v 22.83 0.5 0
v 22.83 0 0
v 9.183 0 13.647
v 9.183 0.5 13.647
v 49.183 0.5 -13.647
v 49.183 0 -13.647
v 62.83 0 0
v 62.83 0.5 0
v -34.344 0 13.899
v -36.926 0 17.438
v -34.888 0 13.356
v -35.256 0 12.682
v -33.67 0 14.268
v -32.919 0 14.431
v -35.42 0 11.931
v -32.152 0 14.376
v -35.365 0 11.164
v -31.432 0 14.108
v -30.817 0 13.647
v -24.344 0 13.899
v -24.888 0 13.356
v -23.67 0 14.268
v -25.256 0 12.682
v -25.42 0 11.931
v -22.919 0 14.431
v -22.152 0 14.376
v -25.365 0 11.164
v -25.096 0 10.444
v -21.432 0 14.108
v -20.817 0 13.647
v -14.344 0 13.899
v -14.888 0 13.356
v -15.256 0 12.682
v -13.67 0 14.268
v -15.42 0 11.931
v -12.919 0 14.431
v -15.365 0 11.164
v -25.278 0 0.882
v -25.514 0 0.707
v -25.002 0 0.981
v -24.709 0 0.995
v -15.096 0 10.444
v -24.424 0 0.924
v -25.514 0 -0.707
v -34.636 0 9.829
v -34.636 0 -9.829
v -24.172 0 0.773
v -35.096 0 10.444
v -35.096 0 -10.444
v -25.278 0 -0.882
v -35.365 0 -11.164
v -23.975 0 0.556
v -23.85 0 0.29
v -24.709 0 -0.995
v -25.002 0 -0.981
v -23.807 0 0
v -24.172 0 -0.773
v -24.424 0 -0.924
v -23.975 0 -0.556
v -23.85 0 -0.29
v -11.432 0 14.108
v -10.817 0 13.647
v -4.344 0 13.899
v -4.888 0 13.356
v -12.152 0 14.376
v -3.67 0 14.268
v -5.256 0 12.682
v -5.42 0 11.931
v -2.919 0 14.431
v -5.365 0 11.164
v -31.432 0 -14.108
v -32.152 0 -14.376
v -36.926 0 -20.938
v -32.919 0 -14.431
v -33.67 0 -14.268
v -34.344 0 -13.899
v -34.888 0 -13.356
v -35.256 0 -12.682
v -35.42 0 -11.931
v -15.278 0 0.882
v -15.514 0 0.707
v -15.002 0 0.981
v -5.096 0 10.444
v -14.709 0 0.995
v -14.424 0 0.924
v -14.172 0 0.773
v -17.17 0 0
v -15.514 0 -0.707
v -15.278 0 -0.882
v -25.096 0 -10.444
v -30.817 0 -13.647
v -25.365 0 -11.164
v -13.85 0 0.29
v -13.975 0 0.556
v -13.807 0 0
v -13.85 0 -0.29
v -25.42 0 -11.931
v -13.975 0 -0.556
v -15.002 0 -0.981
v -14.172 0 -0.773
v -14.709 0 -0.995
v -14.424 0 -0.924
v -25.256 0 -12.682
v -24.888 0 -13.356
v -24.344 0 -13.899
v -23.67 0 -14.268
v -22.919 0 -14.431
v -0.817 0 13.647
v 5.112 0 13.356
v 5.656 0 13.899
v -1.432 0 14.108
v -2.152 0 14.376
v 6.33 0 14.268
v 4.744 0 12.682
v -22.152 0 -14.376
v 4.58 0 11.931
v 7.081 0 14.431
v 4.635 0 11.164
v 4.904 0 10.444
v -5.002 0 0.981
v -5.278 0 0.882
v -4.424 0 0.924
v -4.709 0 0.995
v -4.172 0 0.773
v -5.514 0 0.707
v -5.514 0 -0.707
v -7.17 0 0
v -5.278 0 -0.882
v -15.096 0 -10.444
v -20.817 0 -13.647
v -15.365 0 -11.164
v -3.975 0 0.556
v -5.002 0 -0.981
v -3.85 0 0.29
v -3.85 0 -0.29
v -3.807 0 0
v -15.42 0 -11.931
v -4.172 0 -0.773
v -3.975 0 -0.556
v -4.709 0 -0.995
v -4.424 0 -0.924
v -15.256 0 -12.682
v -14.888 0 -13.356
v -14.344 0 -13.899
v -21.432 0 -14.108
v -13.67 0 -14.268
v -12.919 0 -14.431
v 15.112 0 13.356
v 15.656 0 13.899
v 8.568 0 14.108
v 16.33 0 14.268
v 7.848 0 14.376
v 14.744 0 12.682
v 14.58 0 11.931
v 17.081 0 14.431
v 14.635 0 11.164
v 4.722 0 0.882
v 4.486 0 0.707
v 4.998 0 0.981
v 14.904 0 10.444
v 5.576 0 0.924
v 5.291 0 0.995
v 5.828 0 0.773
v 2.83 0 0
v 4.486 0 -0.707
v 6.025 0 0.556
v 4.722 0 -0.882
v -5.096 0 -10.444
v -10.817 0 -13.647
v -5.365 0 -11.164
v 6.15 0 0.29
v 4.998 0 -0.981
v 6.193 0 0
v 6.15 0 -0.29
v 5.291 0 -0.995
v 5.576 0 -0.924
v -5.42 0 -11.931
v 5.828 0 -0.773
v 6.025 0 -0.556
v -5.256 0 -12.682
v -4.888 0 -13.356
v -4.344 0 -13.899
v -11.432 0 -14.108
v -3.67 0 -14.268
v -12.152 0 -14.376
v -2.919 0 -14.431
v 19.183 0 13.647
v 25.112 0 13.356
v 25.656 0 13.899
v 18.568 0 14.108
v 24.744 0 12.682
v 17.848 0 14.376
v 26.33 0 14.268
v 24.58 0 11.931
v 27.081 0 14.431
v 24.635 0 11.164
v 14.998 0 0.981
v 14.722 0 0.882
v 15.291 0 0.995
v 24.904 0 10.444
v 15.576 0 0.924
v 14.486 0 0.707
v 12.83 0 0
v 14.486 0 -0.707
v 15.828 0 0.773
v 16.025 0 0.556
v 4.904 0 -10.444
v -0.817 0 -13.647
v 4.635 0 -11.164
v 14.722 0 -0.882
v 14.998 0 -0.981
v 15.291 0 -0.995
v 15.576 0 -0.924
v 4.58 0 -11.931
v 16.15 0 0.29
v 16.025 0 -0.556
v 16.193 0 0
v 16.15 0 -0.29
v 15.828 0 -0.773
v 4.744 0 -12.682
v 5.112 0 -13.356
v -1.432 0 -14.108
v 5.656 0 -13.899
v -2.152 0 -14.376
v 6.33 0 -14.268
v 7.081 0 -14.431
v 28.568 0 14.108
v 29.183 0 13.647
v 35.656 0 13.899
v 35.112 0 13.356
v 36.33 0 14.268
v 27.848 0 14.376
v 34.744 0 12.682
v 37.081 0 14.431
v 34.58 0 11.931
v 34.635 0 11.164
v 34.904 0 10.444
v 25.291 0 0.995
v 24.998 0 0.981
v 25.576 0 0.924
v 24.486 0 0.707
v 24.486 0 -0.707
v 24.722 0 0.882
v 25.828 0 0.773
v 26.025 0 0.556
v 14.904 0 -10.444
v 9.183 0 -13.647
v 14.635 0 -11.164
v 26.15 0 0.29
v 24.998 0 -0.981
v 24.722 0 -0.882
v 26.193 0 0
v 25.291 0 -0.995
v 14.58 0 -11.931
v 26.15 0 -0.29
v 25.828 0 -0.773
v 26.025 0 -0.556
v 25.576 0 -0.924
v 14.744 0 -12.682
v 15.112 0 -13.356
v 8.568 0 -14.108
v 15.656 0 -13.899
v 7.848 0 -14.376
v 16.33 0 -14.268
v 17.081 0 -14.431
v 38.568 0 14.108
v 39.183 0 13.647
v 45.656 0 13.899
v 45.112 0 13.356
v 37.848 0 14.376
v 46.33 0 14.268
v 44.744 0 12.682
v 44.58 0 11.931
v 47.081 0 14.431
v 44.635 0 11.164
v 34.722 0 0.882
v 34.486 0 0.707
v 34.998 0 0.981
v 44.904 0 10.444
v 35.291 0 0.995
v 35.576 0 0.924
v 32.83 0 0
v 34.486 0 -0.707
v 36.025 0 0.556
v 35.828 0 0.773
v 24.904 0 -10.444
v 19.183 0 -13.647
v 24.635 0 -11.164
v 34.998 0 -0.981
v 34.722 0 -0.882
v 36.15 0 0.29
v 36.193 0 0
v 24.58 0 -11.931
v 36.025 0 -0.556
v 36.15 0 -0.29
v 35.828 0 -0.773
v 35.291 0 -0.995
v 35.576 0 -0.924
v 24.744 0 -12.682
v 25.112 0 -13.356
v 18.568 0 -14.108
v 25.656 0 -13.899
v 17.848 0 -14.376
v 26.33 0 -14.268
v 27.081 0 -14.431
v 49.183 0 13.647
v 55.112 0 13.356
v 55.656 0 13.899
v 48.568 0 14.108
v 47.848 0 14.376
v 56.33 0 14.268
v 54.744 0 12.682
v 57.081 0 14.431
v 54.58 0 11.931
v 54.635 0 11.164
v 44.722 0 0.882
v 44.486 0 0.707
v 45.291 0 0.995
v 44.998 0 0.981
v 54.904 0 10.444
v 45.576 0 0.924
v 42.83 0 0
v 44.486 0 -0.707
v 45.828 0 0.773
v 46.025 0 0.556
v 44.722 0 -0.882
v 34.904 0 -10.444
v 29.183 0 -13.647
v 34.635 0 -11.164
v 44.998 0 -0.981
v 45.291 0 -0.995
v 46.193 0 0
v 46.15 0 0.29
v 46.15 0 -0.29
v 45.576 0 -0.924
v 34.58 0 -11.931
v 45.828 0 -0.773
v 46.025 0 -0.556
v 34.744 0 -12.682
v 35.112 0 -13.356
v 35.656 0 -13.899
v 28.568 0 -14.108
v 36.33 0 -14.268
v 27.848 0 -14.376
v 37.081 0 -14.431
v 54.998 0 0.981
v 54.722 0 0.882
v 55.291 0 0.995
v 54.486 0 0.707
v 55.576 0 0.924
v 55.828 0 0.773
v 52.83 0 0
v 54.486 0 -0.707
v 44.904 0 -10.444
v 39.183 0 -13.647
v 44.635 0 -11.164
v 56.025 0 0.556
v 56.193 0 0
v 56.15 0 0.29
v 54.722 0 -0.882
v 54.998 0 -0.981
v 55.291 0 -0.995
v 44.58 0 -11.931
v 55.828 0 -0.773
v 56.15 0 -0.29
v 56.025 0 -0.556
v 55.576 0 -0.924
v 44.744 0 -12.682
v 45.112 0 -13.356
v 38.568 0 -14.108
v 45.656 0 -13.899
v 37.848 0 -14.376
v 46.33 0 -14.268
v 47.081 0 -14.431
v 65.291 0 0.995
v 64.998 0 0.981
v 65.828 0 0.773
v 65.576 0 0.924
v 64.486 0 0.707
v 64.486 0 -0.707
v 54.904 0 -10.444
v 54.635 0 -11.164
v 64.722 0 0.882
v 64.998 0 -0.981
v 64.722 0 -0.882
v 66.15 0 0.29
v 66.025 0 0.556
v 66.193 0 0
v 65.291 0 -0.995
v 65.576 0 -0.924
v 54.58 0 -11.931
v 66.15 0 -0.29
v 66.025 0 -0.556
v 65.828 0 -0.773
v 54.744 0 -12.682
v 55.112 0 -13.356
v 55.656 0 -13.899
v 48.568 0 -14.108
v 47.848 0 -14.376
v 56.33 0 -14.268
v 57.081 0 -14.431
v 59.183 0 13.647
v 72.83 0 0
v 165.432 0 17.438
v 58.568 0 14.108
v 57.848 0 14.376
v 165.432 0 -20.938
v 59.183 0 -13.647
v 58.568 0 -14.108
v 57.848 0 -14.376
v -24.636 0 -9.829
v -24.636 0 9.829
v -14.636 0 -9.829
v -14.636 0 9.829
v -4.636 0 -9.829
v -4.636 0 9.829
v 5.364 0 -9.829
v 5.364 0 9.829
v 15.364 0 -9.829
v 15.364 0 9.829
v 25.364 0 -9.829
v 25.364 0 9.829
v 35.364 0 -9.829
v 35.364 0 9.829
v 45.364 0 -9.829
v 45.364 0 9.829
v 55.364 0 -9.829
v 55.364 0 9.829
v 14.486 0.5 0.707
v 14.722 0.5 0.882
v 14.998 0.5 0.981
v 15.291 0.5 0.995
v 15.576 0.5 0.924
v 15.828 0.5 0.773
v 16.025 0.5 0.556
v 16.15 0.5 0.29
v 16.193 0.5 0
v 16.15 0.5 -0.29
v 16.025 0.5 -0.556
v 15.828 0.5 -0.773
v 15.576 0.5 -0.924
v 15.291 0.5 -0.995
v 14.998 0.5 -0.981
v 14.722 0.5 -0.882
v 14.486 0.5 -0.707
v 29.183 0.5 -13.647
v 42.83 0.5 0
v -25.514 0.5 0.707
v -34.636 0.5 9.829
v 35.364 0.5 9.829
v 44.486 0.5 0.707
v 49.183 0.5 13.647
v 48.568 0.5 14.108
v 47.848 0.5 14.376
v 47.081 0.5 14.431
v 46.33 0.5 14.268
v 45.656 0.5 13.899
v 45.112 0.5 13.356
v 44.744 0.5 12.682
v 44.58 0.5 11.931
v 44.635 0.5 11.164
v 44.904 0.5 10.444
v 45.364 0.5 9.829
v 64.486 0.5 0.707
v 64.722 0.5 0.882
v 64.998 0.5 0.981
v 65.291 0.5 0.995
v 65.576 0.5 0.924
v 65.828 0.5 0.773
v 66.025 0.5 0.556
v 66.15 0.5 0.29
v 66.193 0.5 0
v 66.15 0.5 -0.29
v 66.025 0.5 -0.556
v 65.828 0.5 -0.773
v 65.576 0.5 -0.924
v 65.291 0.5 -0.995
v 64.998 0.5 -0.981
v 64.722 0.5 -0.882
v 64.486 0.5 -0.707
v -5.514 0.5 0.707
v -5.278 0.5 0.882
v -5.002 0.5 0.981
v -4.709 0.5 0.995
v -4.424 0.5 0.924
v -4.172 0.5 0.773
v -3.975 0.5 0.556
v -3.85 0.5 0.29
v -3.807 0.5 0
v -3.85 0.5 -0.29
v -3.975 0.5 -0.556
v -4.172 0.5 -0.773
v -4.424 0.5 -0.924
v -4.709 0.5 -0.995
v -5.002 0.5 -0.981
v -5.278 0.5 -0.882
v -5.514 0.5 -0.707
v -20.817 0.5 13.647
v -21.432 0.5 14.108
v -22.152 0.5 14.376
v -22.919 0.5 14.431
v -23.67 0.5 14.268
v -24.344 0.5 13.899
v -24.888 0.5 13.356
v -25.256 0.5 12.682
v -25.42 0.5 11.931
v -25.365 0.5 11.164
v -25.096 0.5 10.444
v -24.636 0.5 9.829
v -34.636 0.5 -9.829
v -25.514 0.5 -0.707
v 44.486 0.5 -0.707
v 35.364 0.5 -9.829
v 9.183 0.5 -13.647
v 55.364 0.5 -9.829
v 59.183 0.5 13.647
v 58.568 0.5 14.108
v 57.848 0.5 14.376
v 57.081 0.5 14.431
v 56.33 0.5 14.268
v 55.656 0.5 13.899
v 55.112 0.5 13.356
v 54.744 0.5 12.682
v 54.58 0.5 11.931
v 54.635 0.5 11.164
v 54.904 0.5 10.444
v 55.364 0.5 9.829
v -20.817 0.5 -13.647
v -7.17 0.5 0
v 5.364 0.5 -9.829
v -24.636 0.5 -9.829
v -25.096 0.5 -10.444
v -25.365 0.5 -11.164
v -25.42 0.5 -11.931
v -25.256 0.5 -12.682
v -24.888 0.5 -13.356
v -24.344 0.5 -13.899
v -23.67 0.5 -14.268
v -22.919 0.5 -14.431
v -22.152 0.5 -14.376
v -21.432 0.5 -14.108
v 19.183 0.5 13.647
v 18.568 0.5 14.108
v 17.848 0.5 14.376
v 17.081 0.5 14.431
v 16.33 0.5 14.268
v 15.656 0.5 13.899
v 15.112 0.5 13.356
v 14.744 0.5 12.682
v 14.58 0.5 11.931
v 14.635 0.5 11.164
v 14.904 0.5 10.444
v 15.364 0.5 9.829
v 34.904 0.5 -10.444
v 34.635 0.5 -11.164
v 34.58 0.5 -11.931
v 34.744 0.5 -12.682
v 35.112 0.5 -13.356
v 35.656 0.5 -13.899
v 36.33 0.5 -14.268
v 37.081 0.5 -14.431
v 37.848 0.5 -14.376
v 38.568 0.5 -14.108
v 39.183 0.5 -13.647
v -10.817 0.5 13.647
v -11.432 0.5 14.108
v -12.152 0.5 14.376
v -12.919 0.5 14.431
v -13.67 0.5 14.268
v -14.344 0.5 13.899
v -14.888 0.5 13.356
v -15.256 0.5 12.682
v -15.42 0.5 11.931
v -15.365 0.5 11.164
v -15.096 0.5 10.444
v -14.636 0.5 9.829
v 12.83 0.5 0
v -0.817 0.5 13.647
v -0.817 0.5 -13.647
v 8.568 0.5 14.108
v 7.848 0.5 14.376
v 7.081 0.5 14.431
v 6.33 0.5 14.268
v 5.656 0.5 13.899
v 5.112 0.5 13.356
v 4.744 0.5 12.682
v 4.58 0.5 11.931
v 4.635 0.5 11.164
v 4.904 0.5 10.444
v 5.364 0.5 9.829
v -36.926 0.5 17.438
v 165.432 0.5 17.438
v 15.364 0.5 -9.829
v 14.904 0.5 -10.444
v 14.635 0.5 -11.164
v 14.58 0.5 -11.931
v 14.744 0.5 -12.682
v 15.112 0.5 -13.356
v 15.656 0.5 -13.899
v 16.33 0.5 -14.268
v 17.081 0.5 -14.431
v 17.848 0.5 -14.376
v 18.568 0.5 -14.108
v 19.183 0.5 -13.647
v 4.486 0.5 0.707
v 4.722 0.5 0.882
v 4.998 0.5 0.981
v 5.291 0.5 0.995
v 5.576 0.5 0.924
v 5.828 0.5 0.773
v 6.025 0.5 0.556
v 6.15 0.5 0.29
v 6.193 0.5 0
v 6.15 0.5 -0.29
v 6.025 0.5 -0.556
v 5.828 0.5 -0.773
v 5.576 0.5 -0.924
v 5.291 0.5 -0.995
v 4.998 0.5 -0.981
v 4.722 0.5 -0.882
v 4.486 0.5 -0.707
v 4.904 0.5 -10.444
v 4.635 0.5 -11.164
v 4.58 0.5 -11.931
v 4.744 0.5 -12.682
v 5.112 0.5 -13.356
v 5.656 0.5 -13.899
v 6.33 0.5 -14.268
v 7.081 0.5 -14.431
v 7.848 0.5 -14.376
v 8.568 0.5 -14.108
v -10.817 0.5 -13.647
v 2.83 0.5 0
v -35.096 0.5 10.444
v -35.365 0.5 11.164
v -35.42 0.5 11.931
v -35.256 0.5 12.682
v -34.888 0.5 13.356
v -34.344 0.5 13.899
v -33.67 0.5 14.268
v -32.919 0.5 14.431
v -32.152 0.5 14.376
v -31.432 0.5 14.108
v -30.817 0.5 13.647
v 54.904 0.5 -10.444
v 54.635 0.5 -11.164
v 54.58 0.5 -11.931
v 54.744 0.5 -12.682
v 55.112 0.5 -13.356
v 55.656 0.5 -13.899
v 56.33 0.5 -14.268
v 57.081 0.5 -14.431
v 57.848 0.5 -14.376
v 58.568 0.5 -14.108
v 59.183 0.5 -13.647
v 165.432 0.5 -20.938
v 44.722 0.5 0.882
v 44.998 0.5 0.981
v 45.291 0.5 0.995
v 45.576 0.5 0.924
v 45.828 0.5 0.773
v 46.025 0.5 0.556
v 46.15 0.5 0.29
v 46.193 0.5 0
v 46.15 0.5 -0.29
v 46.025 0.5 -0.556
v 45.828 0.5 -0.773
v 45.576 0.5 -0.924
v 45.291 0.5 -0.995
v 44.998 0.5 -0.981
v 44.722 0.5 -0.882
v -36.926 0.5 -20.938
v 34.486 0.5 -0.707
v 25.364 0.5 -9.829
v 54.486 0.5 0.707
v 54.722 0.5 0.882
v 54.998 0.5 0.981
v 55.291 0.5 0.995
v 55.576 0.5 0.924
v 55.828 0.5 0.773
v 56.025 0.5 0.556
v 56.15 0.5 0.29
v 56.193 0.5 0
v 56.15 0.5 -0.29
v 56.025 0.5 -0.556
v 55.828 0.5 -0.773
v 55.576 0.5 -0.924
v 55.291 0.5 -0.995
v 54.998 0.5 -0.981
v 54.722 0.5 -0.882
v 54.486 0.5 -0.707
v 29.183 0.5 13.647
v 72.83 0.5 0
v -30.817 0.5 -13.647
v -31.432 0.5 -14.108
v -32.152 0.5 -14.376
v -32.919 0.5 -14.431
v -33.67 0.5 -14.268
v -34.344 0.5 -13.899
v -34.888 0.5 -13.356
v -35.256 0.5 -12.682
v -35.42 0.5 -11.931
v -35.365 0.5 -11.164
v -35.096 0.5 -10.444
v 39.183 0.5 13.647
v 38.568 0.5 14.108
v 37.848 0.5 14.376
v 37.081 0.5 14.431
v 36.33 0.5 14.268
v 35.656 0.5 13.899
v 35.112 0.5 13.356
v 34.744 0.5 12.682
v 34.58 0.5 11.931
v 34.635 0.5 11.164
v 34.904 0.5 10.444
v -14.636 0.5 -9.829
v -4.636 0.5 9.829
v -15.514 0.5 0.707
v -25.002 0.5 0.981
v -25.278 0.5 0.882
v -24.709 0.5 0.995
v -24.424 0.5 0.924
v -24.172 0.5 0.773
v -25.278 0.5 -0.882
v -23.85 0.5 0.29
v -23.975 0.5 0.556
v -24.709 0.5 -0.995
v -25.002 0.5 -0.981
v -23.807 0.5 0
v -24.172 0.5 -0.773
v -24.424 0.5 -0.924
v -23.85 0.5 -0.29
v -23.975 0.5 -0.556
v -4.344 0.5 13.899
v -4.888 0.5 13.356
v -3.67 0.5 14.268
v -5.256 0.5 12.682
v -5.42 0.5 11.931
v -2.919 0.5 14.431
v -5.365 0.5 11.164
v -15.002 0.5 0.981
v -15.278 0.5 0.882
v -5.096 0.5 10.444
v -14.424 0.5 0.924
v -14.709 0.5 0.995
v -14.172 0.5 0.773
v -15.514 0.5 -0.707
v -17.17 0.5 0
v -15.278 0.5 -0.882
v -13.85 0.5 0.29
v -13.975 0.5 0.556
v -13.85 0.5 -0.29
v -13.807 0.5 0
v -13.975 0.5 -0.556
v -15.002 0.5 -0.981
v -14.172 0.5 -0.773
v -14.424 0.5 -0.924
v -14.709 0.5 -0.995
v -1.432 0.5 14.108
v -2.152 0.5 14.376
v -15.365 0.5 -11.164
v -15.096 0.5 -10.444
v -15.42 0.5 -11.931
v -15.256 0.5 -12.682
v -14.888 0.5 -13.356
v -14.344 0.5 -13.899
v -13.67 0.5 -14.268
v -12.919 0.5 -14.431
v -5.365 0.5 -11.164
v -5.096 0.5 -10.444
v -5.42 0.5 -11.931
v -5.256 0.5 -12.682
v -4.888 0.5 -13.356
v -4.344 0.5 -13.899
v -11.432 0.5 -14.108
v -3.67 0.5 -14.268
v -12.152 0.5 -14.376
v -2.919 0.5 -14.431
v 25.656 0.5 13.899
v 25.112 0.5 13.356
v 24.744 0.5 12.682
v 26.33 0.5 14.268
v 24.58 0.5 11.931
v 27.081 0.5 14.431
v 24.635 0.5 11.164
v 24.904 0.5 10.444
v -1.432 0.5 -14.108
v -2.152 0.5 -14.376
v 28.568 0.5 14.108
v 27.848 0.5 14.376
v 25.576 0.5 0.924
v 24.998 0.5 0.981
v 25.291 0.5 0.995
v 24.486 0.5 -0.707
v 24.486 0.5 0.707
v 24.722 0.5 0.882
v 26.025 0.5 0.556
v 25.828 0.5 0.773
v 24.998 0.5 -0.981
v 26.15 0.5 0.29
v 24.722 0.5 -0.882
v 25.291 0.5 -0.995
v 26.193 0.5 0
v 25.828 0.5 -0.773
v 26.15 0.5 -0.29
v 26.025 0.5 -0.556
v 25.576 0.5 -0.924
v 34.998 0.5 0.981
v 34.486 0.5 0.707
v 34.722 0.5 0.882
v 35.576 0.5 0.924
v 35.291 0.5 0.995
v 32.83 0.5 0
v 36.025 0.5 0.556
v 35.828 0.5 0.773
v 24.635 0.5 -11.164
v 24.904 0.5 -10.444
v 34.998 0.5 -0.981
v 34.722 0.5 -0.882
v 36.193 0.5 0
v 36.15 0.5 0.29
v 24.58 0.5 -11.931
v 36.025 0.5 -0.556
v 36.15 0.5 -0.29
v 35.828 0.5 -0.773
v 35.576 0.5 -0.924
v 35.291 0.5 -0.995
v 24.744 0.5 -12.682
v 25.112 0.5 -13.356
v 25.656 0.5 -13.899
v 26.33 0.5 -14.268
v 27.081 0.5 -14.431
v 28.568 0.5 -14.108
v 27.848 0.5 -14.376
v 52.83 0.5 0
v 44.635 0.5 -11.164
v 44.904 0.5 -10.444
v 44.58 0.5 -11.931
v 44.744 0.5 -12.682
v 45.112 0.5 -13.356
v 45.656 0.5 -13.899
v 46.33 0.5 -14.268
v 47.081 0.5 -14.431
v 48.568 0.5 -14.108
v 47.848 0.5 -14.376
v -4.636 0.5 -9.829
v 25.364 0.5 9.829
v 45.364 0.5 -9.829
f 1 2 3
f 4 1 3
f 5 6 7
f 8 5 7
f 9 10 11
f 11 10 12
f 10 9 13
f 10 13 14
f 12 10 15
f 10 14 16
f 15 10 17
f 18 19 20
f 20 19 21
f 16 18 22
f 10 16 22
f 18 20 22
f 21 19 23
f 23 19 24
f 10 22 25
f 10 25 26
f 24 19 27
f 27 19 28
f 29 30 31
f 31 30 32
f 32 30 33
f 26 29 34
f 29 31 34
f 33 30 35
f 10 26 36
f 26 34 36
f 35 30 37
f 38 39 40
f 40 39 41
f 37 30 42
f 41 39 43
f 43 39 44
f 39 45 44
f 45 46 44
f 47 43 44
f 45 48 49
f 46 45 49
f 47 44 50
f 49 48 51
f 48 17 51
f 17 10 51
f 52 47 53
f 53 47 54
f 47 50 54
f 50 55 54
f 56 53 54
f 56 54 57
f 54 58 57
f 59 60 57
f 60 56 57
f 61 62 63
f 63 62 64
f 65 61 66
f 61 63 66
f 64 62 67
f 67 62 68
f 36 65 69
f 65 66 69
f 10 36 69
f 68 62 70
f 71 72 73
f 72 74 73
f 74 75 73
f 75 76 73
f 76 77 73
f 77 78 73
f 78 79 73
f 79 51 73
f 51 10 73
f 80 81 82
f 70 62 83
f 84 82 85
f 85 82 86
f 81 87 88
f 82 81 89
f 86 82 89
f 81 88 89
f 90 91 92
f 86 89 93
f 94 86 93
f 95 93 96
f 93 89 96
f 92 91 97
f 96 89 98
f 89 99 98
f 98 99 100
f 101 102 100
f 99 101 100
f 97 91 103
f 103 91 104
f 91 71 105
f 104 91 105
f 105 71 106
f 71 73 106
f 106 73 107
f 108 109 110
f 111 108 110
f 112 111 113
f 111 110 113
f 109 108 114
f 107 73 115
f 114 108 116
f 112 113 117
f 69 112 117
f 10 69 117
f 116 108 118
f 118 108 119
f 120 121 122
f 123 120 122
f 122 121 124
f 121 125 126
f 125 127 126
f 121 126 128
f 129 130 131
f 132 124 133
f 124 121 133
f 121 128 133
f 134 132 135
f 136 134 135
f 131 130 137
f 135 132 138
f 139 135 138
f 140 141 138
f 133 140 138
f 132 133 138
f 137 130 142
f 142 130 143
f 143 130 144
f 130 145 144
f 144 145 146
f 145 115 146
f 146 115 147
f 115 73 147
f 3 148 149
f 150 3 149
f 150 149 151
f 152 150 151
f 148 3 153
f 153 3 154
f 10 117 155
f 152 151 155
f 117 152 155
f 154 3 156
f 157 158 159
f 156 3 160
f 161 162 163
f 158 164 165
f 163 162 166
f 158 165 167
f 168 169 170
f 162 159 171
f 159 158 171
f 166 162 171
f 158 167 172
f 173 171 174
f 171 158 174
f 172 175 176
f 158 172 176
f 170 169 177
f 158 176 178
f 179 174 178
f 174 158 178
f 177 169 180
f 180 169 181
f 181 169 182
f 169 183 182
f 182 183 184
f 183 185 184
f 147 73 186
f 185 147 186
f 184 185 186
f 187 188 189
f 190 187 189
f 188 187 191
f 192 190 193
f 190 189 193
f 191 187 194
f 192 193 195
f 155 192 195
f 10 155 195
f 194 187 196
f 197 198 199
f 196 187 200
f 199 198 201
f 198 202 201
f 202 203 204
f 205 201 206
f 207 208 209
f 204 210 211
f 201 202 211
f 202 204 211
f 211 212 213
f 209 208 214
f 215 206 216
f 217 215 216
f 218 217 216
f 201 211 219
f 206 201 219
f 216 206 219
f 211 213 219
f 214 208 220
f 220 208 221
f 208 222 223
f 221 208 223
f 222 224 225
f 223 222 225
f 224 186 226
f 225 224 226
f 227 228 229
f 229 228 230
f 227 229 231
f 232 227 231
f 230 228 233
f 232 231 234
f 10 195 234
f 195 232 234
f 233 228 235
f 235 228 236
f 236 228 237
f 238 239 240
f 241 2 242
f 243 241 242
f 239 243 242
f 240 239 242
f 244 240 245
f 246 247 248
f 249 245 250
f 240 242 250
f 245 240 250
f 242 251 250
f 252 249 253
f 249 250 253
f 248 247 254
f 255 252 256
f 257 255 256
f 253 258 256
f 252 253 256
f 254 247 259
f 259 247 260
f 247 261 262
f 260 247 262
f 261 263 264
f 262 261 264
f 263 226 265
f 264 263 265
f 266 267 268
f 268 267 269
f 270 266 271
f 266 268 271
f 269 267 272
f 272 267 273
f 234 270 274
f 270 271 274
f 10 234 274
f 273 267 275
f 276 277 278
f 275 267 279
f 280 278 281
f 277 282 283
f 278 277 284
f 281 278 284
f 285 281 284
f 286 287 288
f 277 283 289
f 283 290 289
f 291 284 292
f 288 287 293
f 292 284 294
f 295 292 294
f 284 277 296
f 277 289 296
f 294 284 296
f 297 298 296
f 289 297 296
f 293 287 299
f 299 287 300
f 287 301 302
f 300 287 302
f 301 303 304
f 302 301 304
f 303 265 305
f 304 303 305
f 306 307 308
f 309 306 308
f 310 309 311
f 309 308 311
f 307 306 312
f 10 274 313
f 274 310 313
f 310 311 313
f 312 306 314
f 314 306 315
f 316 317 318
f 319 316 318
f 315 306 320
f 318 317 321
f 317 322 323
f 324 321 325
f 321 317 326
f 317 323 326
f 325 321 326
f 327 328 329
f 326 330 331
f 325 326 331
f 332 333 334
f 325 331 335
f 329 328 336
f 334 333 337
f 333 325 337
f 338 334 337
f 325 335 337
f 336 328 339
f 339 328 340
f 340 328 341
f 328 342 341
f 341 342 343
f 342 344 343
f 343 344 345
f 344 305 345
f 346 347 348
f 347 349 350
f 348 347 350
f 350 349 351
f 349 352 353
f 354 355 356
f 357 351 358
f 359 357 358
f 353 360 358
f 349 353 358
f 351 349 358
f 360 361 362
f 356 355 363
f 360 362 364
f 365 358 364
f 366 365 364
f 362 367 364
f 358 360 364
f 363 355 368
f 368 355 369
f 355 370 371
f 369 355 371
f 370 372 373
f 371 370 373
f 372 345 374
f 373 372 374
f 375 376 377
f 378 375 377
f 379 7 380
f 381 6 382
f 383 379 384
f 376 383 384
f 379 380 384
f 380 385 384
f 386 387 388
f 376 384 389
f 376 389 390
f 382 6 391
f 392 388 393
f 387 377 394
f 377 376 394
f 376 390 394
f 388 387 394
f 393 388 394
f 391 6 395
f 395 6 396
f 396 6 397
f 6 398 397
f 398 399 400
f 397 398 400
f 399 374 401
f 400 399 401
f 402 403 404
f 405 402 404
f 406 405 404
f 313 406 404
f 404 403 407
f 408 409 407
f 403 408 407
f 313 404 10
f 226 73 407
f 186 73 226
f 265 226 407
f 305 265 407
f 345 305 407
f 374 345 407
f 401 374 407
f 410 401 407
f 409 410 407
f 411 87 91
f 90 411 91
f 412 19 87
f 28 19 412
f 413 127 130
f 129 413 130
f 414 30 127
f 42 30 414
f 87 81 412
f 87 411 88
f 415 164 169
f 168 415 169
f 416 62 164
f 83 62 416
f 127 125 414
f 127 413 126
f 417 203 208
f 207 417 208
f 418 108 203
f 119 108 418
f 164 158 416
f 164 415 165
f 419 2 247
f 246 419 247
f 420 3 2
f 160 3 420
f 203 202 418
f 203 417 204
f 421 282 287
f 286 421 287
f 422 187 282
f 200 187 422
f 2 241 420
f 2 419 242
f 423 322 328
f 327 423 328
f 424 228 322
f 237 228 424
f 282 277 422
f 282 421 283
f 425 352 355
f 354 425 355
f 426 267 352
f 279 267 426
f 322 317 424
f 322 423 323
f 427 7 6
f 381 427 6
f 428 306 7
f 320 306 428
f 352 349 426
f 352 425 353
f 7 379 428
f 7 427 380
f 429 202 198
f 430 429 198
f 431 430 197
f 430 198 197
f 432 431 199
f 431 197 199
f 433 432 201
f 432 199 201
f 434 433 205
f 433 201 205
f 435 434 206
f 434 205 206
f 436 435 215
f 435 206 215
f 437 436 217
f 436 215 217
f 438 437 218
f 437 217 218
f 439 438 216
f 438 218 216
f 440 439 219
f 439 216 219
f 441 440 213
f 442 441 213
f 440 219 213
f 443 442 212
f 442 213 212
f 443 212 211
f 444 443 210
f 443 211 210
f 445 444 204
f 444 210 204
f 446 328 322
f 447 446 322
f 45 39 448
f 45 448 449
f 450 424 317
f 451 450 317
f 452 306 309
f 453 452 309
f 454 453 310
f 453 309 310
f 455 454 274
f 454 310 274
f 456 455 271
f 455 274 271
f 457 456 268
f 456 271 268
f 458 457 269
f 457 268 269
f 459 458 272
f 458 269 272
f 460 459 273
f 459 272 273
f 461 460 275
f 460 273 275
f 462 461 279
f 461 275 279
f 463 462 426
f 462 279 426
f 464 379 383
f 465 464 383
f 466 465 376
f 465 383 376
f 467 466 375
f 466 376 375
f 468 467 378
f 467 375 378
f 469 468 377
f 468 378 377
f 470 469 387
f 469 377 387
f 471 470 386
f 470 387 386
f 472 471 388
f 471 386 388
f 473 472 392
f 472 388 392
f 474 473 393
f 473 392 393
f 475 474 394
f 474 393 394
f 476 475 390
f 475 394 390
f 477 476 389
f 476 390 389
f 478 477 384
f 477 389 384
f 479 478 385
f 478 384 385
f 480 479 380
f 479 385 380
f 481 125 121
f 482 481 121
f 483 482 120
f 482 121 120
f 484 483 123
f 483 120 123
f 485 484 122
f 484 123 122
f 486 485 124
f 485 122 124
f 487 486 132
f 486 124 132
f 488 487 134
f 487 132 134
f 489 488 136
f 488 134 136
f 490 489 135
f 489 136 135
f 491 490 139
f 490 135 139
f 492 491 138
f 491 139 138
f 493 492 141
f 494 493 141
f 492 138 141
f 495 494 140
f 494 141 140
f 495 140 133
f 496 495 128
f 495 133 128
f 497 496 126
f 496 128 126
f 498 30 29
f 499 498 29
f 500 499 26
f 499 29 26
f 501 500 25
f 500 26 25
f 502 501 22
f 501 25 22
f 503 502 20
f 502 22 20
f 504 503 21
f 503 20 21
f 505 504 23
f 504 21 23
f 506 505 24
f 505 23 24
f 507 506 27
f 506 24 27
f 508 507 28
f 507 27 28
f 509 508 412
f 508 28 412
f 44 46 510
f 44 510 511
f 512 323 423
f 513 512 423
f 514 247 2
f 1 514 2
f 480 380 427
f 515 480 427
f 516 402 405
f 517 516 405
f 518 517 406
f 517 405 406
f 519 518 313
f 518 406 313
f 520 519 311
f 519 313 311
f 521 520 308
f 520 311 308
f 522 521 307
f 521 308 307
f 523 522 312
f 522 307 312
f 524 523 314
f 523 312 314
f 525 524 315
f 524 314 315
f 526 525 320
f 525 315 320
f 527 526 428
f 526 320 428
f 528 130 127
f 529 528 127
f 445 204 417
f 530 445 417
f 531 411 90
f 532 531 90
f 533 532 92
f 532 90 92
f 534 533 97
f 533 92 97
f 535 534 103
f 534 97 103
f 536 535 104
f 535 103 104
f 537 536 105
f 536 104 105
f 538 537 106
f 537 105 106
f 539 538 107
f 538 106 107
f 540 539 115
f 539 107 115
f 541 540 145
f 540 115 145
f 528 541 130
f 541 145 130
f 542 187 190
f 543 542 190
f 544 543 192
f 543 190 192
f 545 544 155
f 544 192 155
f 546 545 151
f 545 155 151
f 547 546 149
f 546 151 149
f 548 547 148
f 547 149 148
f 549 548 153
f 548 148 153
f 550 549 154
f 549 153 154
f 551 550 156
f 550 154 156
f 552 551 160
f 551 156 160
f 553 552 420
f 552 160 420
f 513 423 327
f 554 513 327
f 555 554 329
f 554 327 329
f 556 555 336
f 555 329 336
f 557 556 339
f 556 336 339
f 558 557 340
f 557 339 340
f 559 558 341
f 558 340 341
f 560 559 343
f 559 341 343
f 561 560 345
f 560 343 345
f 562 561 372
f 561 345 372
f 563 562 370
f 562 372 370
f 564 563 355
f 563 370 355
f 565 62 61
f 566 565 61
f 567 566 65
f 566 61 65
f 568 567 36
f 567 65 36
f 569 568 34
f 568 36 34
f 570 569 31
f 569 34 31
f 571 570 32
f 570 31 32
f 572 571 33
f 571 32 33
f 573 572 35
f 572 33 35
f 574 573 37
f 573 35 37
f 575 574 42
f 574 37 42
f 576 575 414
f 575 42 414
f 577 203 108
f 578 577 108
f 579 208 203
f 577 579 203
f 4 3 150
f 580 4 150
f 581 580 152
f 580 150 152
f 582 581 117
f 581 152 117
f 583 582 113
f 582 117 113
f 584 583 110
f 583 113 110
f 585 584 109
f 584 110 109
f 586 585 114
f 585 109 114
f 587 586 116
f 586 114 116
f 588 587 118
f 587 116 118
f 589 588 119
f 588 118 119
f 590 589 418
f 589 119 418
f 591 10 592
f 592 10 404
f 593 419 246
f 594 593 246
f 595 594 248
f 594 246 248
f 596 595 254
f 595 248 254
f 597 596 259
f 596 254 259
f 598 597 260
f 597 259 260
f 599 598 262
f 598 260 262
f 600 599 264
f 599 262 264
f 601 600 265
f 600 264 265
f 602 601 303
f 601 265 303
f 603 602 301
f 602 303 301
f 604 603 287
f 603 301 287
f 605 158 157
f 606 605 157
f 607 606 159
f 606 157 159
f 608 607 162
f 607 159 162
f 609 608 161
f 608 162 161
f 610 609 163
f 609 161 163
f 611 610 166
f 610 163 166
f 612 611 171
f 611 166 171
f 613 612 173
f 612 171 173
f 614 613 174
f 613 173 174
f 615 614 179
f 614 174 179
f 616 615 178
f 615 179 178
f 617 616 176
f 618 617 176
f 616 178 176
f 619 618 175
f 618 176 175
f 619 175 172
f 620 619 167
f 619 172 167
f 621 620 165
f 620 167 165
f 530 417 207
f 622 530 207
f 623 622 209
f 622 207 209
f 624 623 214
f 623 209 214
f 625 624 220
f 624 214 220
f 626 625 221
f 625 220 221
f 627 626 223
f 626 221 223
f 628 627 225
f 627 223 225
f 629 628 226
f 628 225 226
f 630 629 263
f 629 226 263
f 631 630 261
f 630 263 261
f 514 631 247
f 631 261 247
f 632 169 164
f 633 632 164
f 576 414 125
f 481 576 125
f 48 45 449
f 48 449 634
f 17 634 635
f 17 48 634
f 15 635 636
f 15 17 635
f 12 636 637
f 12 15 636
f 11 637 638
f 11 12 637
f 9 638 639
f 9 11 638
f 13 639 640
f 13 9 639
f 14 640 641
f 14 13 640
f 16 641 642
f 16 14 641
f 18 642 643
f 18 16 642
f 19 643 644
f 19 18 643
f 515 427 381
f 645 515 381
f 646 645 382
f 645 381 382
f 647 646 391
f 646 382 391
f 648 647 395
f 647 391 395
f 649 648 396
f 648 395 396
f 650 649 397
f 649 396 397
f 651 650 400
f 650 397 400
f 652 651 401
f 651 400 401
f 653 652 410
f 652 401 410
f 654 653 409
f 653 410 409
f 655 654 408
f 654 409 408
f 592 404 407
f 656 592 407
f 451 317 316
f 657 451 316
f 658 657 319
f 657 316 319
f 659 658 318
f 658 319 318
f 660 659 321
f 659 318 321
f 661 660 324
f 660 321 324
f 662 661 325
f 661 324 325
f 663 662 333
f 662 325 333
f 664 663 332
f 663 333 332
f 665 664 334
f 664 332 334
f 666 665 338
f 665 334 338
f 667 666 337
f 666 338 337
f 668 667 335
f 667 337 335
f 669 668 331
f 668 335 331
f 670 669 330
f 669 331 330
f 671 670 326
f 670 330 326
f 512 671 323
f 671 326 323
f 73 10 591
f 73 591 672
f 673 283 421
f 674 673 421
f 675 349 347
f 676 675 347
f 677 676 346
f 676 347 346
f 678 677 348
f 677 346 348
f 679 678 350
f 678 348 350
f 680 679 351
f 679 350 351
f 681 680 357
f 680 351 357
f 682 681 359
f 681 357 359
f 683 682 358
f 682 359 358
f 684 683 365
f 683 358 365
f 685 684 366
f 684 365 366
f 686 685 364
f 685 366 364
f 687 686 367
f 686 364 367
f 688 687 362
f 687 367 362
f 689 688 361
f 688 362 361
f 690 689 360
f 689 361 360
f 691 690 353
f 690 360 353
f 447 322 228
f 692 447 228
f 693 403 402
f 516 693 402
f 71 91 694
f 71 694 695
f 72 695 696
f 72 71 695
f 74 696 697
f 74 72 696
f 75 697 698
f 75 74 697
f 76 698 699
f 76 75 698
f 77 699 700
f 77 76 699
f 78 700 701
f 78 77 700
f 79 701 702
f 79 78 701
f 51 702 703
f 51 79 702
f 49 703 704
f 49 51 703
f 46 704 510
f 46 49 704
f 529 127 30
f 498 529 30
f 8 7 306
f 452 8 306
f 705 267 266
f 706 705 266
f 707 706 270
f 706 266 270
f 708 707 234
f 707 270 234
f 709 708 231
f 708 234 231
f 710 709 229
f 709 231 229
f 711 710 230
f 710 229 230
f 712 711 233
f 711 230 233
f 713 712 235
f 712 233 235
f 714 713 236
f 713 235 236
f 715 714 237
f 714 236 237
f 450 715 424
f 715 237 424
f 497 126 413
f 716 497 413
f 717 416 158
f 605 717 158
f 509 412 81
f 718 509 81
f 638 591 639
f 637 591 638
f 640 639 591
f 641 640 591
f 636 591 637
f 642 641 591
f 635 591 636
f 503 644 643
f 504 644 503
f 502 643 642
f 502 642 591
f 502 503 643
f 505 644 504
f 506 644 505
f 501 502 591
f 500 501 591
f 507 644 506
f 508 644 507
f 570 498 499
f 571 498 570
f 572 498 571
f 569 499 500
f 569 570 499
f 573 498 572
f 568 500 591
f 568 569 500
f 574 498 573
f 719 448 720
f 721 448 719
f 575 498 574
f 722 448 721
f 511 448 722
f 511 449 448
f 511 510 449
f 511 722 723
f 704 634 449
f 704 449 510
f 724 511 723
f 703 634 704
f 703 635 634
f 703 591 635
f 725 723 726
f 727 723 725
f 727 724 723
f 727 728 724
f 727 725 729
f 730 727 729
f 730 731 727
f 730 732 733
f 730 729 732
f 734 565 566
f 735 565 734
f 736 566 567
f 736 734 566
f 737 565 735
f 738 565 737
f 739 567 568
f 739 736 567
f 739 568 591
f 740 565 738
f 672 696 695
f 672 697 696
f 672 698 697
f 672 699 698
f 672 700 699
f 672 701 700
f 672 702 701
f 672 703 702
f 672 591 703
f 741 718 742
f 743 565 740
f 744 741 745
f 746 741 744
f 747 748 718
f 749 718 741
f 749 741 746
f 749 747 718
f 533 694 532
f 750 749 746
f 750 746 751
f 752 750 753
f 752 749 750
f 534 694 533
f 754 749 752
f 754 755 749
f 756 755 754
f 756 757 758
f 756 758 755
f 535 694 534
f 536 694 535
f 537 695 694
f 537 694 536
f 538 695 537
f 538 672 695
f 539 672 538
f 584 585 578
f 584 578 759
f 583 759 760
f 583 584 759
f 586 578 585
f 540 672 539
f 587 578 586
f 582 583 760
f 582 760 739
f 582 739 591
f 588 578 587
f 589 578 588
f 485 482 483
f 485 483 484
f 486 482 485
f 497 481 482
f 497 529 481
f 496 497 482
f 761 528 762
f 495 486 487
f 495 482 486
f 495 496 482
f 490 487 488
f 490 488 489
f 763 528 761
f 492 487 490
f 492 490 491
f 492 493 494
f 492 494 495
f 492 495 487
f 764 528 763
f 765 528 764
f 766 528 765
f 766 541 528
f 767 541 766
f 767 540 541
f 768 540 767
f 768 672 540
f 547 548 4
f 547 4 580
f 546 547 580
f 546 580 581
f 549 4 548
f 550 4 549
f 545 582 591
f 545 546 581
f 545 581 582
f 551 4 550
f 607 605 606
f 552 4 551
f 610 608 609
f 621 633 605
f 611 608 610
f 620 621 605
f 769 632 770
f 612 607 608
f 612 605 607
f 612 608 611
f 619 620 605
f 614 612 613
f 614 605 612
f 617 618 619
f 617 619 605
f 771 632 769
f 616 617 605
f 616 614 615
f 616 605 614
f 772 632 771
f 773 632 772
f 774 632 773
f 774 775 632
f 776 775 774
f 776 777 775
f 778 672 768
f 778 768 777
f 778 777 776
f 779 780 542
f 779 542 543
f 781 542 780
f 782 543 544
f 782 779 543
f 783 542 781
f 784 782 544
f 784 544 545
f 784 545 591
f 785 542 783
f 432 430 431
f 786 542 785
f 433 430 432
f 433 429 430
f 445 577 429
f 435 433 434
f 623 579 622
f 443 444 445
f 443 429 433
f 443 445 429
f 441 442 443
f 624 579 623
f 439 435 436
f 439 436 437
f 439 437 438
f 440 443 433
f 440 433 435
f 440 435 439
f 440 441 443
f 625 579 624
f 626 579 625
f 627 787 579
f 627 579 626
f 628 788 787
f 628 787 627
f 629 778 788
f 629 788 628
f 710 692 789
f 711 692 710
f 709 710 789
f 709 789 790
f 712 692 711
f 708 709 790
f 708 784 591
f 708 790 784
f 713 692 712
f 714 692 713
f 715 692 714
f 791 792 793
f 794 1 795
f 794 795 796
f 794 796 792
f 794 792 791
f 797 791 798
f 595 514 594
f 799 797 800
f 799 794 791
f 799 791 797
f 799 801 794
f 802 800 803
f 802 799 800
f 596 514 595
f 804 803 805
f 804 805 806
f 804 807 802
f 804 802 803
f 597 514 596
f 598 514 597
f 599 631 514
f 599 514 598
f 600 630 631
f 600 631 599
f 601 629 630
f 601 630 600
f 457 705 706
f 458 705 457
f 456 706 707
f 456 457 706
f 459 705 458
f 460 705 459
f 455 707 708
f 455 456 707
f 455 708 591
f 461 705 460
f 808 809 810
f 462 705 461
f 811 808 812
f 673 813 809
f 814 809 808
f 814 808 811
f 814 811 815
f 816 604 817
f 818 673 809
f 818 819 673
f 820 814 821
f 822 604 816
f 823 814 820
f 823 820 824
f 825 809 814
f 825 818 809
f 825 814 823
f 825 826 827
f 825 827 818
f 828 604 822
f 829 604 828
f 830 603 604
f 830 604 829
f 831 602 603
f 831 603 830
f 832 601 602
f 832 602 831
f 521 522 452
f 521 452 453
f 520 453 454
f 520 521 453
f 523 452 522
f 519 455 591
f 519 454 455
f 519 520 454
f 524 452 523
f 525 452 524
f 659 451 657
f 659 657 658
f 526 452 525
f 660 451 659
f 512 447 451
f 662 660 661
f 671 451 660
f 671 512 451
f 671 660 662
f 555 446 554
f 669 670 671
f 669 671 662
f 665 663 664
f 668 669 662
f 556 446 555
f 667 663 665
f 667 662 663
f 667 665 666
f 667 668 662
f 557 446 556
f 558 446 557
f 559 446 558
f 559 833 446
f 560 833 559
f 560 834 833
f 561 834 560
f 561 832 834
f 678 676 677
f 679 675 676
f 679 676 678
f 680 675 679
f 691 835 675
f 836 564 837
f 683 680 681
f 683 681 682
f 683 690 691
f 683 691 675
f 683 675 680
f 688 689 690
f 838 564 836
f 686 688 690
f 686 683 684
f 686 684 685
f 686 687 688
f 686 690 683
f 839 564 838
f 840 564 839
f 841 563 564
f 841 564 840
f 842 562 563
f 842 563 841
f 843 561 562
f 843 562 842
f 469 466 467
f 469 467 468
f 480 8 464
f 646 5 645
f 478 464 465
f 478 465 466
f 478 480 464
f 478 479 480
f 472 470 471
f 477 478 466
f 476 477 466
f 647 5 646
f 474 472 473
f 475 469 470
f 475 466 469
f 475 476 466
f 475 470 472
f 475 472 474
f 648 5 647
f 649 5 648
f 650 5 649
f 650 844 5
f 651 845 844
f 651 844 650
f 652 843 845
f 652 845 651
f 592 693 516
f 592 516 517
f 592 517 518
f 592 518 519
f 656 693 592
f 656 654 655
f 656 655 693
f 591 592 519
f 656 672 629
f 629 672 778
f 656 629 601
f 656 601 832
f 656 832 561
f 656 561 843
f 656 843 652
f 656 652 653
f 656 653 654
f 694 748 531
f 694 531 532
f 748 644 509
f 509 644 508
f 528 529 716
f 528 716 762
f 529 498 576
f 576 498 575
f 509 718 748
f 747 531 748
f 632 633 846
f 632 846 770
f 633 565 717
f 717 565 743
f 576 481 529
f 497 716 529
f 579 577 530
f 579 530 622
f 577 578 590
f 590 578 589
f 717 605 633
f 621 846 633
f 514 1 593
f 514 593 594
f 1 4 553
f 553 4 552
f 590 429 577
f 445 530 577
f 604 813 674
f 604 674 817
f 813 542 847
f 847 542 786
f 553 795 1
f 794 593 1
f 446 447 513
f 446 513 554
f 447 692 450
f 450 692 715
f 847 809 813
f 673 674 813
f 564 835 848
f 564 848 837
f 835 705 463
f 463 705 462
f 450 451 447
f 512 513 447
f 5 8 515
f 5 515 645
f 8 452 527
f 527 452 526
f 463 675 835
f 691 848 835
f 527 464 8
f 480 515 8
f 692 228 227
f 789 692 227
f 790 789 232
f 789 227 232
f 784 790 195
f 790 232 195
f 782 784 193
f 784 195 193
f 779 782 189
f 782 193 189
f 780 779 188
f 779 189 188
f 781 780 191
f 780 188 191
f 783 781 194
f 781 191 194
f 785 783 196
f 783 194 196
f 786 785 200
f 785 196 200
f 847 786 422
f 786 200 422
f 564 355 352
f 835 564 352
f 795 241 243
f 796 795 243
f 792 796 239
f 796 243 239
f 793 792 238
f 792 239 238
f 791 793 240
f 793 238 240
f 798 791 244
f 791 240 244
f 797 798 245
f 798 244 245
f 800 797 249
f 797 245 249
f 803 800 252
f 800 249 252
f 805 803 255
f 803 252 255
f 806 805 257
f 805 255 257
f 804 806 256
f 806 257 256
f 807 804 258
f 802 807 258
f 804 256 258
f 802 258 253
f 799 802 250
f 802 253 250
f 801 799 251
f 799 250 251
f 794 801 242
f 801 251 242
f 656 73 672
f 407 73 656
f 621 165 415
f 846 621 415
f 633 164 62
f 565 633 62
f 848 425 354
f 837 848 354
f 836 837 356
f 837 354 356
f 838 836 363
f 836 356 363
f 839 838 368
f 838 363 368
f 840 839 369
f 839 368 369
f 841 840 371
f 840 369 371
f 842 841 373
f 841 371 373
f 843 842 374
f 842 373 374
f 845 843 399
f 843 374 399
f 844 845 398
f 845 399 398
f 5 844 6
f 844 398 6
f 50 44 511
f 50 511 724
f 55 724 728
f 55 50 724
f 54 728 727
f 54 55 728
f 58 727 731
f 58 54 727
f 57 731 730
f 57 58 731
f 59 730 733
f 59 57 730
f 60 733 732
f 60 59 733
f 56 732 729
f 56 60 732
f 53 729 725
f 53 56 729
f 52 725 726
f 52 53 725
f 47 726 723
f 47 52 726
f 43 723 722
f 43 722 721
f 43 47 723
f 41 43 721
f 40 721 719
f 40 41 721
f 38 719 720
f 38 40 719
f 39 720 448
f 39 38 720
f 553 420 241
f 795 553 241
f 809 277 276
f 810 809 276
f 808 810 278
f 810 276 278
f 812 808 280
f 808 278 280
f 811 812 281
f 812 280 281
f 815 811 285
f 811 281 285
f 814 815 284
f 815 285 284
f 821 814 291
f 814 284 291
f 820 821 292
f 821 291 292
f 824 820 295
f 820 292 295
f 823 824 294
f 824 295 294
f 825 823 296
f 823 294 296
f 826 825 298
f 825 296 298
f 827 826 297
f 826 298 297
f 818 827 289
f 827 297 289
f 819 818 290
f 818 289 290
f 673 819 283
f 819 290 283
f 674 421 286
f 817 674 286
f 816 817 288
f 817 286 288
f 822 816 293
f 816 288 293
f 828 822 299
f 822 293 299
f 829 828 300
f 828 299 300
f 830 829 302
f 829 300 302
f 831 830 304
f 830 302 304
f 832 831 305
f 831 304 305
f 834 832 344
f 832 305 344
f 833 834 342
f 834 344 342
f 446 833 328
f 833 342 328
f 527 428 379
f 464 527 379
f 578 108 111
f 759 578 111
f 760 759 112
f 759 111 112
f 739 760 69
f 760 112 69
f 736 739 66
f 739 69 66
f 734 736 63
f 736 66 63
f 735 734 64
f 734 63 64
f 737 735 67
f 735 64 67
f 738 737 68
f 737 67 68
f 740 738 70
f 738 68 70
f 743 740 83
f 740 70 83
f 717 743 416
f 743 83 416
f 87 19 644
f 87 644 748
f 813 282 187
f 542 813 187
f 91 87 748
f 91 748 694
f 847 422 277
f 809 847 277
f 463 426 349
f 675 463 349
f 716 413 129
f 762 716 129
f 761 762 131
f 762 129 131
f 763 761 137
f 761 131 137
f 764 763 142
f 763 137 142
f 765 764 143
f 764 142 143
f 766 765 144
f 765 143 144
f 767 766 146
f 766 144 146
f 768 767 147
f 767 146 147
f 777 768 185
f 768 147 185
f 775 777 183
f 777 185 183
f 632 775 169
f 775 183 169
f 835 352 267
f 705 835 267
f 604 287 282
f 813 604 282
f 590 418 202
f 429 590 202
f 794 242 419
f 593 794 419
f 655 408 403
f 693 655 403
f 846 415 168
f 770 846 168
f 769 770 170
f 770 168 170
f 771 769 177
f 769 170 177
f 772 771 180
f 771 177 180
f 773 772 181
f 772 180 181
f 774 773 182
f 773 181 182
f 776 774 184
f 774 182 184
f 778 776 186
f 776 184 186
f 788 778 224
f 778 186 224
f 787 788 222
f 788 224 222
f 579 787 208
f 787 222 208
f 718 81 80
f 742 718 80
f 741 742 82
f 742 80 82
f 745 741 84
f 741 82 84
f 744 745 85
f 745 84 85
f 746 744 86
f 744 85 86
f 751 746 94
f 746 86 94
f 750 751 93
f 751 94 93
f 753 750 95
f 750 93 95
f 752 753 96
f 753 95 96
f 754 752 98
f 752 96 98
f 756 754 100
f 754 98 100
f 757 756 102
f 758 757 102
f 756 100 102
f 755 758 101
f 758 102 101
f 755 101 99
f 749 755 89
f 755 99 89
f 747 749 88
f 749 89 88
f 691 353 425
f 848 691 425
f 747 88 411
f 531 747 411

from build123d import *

# Parameters (mm, degrees)
SKETCH1_W           = 202.358038397
SKETCH1_H           = 38.375945136
BOSS_EXTRUDE1_DEPTH = 0.5


with BuildPart() as part:
    # Sketch1 → Boss-Extrude1 (new body)
    with BuildSketch(Plane(origin=(0, 0, 0), x_dir=(1, 0, 0), z_dir=(0, 1, 0))):
        with Locations((64.252599363, 1.75)):
            Rectangle(SKETCH1_W, SKETCH1_H)
        with BuildLine():
            Line((-34.635608145, 9.828784258), (-25.513930667, 0.707106781))
            ThreePointArc((-25.513930667, 0.707106781), (-23.806823886, 0), (-25.513930667, -0.707106781))
            Line((-25.513930667, -0.707106781), (-34.635608145, -9.828784258))
            ThreePointArc((-34.635608145, -9.828784258), (-34.635608145, -13.647160877), (-30.817231526, -13.647160877))
            Line((-30.817231526, -13.647160877), (-17.170070649, 0))
            Line((-17.170070649, 0), (-30.817231526, 13.647160877))
            ThreePointArc((-30.817231526, 13.647160877), (-34.635608145, 13.647160877), (-34.635608145, 9.828784258))
        make_face(mode=Mode.SUBTRACT)
        with BuildLine():
            Line((-20.817231526, 13.647160877), (-7.170070649, 0))
            Line((-7.170070649, 0), (-20.817231526, -13.647160877))
            ThreePointArc((-20.817231526, -13.647160877), (-24.635608145, -13.647160877), (-24.635608145, -9.828784258))
            Line((-24.635608145, -9.828784258), (-15.513930667, -0.707106781))
            ThreePointArc((-15.513930667, -0.707106781), (-13.806823886, 0), (-15.513930667, 0.707106781))
            Line((-15.513930667, 0.707106781), (-24.635608145, 9.828784258))
            ThreePointArc((-24.635608145, 9.828784258), (-24.635608145, 13.647160877), (-20.817231526, 13.647160877))
        make_face(mode=Mode.SUBTRACT)
        with BuildLine():
            Line((-10.817231526, 13.647160877), (2.829929351, 0))
            Line((2.829929351, 0), (-10.817231526, -13.647160877))
            ThreePointArc((-10.817231526, -13.647160877), (-14.635608145, -13.647160877), (-14.635608145, -9.828784258))
            Line((-14.635608145, -9.828784258), (-5.513930667, -0.707106781))
            ThreePointArc((-5.513930667, -0.707106781), (-3.806823886, 0), (-5.513930667, 0.707106781))
            Line((-5.513930667, 0.707106781), (-14.635608145, 9.828784258))
            ThreePointArc((-14.635608145, 9.828784258), (-14.635608145, 13.647160877), (-10.817231526, 13.647160877))
        make_face(mode=Mode.SUBTRACT)
        with BuildLine():
            Line((-0.817231526, 13.647160877), (12.829929351, 0))
            Line((12.829929351, 0), (-0.817231526, -13.647160877))
            ThreePointArc((-0.817231526, -13.647160877), (-4.635608145, -13.647160877), (-4.635608145, -9.828784258))
            Line((-4.635608145, -9.828784258), (4.486069333, -0.707106781))
            ThreePointArc((4.486069333, -0.707106781), (6.193176114, 0), (4.486069333, 0.707106781))
            Line((4.486069333, 0.707106781), (-4.635608145, 9.828784258))
            ThreePointArc((-4.635608145, 9.828784258), (-4.635608145, 13.647160877), (-0.817231526, 13.647160877))
        make_face(mode=Mode.SUBTRACT)
        with BuildLine():
            Line((9.182768474, 13.647160877), (22.829929351, 0))
            Line((22.829929351, 0), (9.182768474, -13.647160877))
            ThreePointArc((9.182768474, -13.647160877), (5.364391855, -13.647160877), (5.364391855, -9.828784258))
            Line((5.364391855, -9.828784258), (14.486069333, -0.707106781))
            ThreePointArc((14.486069333, -0.707106781), (16.193176114, 0), (14.486069333, 0.707106781))
            Line((14.486069333, 0.707106781), (5.364391855, 9.828784258))
            ThreePointArc((5.364391855, 9.828784258), (5.364391855, 13.647160877), (9.182768474, 13.647160877))
        make_face(mode=Mode.SUBTRACT)
        with BuildLine():
            Line((19.182768474, 13.647160877), (32.829929351, 0))
            Line((32.829929351, 0), (19.182768474, -13.647160877))
            ThreePointArc((19.182768474, -13.647160877), (15.364391855, -13.647160877), (15.364391855, -9.828784258))
            Line((15.364391855, -9.828784258), (24.486069333, -0.707106781))
            ThreePointArc((24.486069333, -0.707106781), (26.193176114, 0), (24.486069333, 0.707106781))
            Line((24.486069333, 0.707106781), (15.364391855, 9.828784258))
            ThreePointArc((15.364391855, 9.828784258), (15.364391855, 13.647160877), (19.182768474, 13.647160877))
        make_face(mode=Mode.SUBTRACT)
        with BuildLine():
            Line((29.182768474, 13.647160877), (42.829929351, 0))
            Line((42.829929351, 0), (29.182768474, -13.647160877))
            ThreePointArc((29.182768474, -13.647160877), (25.364391855, -13.647160877), (25.364391855, -9.828784258))
            Line((25.364391855, -9.828784258), (34.486069333, -0.707106781))
            ThreePointArc((34.486069333, -0.707106781), (36.193176114, 0), (34.486069333, 0.707106781))
            Line((34.486069333, 0.707106781), (25.364391855, 9.828784258))
            ThreePointArc((25.364391855, 9.828784258), (25.364391855, 13.647160877), (29.182768474, 13.647160877))
        make_face(mode=Mode.SUBTRACT)
        with BuildLine():
            Line((39.182768474, 13.647160877), (52.829929351, 0))
            Line((52.829929351, 0), (39.182768474, -13.647160877))
            ThreePointArc((39.182768474, -13.647160877), (35.364391855, -13.647160877), (35.364391855, -9.828784258))
            Line((35.364391855, -9.828784258), (44.486069333, -0.707106781))
            ThreePointArc((44.486069333, -0.707106781), (46.193176114, 0), (44.486069333, 0.707106781))
            Line((44.486069333, 0.707106781), (35.364391855, 9.828784258))
            ThreePointArc((35.364391855, 9.828784258), (35.364391855, 13.647160877), (39.182768474, 13.647160877))
        make_face(mode=Mode.SUBTRACT)
        with BuildLine():
            Line((49.182768474, 13.647160877), (62.829929351, 0))
            Line((62.829929351, 0), (49.182768474, -13.647160877))
            ThreePointArc((49.182768474, -13.647160877), (45.364391855, -13.647160877), (45.364391855, -9.828784258))
            Line((45.364391855, -9.828784258), (54.486069333, -0.707106781))
            ThreePointArc((54.486069333, -0.707106781), (56.193176114, 0), (54.486069333, 0.707106781))
            Line((54.486069333, 0.707106781), (45.364391855, 9.828784258))
            ThreePointArc((45.364391855, 9.828784258), (45.364391855, 13.647160877), (49.182768474, 13.647160877))
        make_face(mode=Mode.SUBTRACT)
        with BuildLine():
            Line((59.182768474, 13.647160877), (72.829929351, 0))
            Line((72.829929351, 0), (59.182768474, -13.647160877))
            ThreePointArc((59.182768474, -13.647160877), (55.364391855, -13.647160877), (55.364391855, -9.828784258))
            Line((55.364391855, -9.828784258), (64.486069333, -0.707106781))
            ThreePointArc((64.486069333, -0.707106781), (66.193176114, 0), (64.486069333, 0.707106781))
            Line((64.486069333, 0.707106781), (55.364391855, 9.828784258))
            ThreePointArc((55.364391855, 9.828784258), (55.364391855, 13.647160877), (59.182768474, 13.647160877))
        make_face(mode=Mode.SUBTRACT)
    extrude(amount=BOSS_EXTRUDE1_DEPTH)


solid = part.part
